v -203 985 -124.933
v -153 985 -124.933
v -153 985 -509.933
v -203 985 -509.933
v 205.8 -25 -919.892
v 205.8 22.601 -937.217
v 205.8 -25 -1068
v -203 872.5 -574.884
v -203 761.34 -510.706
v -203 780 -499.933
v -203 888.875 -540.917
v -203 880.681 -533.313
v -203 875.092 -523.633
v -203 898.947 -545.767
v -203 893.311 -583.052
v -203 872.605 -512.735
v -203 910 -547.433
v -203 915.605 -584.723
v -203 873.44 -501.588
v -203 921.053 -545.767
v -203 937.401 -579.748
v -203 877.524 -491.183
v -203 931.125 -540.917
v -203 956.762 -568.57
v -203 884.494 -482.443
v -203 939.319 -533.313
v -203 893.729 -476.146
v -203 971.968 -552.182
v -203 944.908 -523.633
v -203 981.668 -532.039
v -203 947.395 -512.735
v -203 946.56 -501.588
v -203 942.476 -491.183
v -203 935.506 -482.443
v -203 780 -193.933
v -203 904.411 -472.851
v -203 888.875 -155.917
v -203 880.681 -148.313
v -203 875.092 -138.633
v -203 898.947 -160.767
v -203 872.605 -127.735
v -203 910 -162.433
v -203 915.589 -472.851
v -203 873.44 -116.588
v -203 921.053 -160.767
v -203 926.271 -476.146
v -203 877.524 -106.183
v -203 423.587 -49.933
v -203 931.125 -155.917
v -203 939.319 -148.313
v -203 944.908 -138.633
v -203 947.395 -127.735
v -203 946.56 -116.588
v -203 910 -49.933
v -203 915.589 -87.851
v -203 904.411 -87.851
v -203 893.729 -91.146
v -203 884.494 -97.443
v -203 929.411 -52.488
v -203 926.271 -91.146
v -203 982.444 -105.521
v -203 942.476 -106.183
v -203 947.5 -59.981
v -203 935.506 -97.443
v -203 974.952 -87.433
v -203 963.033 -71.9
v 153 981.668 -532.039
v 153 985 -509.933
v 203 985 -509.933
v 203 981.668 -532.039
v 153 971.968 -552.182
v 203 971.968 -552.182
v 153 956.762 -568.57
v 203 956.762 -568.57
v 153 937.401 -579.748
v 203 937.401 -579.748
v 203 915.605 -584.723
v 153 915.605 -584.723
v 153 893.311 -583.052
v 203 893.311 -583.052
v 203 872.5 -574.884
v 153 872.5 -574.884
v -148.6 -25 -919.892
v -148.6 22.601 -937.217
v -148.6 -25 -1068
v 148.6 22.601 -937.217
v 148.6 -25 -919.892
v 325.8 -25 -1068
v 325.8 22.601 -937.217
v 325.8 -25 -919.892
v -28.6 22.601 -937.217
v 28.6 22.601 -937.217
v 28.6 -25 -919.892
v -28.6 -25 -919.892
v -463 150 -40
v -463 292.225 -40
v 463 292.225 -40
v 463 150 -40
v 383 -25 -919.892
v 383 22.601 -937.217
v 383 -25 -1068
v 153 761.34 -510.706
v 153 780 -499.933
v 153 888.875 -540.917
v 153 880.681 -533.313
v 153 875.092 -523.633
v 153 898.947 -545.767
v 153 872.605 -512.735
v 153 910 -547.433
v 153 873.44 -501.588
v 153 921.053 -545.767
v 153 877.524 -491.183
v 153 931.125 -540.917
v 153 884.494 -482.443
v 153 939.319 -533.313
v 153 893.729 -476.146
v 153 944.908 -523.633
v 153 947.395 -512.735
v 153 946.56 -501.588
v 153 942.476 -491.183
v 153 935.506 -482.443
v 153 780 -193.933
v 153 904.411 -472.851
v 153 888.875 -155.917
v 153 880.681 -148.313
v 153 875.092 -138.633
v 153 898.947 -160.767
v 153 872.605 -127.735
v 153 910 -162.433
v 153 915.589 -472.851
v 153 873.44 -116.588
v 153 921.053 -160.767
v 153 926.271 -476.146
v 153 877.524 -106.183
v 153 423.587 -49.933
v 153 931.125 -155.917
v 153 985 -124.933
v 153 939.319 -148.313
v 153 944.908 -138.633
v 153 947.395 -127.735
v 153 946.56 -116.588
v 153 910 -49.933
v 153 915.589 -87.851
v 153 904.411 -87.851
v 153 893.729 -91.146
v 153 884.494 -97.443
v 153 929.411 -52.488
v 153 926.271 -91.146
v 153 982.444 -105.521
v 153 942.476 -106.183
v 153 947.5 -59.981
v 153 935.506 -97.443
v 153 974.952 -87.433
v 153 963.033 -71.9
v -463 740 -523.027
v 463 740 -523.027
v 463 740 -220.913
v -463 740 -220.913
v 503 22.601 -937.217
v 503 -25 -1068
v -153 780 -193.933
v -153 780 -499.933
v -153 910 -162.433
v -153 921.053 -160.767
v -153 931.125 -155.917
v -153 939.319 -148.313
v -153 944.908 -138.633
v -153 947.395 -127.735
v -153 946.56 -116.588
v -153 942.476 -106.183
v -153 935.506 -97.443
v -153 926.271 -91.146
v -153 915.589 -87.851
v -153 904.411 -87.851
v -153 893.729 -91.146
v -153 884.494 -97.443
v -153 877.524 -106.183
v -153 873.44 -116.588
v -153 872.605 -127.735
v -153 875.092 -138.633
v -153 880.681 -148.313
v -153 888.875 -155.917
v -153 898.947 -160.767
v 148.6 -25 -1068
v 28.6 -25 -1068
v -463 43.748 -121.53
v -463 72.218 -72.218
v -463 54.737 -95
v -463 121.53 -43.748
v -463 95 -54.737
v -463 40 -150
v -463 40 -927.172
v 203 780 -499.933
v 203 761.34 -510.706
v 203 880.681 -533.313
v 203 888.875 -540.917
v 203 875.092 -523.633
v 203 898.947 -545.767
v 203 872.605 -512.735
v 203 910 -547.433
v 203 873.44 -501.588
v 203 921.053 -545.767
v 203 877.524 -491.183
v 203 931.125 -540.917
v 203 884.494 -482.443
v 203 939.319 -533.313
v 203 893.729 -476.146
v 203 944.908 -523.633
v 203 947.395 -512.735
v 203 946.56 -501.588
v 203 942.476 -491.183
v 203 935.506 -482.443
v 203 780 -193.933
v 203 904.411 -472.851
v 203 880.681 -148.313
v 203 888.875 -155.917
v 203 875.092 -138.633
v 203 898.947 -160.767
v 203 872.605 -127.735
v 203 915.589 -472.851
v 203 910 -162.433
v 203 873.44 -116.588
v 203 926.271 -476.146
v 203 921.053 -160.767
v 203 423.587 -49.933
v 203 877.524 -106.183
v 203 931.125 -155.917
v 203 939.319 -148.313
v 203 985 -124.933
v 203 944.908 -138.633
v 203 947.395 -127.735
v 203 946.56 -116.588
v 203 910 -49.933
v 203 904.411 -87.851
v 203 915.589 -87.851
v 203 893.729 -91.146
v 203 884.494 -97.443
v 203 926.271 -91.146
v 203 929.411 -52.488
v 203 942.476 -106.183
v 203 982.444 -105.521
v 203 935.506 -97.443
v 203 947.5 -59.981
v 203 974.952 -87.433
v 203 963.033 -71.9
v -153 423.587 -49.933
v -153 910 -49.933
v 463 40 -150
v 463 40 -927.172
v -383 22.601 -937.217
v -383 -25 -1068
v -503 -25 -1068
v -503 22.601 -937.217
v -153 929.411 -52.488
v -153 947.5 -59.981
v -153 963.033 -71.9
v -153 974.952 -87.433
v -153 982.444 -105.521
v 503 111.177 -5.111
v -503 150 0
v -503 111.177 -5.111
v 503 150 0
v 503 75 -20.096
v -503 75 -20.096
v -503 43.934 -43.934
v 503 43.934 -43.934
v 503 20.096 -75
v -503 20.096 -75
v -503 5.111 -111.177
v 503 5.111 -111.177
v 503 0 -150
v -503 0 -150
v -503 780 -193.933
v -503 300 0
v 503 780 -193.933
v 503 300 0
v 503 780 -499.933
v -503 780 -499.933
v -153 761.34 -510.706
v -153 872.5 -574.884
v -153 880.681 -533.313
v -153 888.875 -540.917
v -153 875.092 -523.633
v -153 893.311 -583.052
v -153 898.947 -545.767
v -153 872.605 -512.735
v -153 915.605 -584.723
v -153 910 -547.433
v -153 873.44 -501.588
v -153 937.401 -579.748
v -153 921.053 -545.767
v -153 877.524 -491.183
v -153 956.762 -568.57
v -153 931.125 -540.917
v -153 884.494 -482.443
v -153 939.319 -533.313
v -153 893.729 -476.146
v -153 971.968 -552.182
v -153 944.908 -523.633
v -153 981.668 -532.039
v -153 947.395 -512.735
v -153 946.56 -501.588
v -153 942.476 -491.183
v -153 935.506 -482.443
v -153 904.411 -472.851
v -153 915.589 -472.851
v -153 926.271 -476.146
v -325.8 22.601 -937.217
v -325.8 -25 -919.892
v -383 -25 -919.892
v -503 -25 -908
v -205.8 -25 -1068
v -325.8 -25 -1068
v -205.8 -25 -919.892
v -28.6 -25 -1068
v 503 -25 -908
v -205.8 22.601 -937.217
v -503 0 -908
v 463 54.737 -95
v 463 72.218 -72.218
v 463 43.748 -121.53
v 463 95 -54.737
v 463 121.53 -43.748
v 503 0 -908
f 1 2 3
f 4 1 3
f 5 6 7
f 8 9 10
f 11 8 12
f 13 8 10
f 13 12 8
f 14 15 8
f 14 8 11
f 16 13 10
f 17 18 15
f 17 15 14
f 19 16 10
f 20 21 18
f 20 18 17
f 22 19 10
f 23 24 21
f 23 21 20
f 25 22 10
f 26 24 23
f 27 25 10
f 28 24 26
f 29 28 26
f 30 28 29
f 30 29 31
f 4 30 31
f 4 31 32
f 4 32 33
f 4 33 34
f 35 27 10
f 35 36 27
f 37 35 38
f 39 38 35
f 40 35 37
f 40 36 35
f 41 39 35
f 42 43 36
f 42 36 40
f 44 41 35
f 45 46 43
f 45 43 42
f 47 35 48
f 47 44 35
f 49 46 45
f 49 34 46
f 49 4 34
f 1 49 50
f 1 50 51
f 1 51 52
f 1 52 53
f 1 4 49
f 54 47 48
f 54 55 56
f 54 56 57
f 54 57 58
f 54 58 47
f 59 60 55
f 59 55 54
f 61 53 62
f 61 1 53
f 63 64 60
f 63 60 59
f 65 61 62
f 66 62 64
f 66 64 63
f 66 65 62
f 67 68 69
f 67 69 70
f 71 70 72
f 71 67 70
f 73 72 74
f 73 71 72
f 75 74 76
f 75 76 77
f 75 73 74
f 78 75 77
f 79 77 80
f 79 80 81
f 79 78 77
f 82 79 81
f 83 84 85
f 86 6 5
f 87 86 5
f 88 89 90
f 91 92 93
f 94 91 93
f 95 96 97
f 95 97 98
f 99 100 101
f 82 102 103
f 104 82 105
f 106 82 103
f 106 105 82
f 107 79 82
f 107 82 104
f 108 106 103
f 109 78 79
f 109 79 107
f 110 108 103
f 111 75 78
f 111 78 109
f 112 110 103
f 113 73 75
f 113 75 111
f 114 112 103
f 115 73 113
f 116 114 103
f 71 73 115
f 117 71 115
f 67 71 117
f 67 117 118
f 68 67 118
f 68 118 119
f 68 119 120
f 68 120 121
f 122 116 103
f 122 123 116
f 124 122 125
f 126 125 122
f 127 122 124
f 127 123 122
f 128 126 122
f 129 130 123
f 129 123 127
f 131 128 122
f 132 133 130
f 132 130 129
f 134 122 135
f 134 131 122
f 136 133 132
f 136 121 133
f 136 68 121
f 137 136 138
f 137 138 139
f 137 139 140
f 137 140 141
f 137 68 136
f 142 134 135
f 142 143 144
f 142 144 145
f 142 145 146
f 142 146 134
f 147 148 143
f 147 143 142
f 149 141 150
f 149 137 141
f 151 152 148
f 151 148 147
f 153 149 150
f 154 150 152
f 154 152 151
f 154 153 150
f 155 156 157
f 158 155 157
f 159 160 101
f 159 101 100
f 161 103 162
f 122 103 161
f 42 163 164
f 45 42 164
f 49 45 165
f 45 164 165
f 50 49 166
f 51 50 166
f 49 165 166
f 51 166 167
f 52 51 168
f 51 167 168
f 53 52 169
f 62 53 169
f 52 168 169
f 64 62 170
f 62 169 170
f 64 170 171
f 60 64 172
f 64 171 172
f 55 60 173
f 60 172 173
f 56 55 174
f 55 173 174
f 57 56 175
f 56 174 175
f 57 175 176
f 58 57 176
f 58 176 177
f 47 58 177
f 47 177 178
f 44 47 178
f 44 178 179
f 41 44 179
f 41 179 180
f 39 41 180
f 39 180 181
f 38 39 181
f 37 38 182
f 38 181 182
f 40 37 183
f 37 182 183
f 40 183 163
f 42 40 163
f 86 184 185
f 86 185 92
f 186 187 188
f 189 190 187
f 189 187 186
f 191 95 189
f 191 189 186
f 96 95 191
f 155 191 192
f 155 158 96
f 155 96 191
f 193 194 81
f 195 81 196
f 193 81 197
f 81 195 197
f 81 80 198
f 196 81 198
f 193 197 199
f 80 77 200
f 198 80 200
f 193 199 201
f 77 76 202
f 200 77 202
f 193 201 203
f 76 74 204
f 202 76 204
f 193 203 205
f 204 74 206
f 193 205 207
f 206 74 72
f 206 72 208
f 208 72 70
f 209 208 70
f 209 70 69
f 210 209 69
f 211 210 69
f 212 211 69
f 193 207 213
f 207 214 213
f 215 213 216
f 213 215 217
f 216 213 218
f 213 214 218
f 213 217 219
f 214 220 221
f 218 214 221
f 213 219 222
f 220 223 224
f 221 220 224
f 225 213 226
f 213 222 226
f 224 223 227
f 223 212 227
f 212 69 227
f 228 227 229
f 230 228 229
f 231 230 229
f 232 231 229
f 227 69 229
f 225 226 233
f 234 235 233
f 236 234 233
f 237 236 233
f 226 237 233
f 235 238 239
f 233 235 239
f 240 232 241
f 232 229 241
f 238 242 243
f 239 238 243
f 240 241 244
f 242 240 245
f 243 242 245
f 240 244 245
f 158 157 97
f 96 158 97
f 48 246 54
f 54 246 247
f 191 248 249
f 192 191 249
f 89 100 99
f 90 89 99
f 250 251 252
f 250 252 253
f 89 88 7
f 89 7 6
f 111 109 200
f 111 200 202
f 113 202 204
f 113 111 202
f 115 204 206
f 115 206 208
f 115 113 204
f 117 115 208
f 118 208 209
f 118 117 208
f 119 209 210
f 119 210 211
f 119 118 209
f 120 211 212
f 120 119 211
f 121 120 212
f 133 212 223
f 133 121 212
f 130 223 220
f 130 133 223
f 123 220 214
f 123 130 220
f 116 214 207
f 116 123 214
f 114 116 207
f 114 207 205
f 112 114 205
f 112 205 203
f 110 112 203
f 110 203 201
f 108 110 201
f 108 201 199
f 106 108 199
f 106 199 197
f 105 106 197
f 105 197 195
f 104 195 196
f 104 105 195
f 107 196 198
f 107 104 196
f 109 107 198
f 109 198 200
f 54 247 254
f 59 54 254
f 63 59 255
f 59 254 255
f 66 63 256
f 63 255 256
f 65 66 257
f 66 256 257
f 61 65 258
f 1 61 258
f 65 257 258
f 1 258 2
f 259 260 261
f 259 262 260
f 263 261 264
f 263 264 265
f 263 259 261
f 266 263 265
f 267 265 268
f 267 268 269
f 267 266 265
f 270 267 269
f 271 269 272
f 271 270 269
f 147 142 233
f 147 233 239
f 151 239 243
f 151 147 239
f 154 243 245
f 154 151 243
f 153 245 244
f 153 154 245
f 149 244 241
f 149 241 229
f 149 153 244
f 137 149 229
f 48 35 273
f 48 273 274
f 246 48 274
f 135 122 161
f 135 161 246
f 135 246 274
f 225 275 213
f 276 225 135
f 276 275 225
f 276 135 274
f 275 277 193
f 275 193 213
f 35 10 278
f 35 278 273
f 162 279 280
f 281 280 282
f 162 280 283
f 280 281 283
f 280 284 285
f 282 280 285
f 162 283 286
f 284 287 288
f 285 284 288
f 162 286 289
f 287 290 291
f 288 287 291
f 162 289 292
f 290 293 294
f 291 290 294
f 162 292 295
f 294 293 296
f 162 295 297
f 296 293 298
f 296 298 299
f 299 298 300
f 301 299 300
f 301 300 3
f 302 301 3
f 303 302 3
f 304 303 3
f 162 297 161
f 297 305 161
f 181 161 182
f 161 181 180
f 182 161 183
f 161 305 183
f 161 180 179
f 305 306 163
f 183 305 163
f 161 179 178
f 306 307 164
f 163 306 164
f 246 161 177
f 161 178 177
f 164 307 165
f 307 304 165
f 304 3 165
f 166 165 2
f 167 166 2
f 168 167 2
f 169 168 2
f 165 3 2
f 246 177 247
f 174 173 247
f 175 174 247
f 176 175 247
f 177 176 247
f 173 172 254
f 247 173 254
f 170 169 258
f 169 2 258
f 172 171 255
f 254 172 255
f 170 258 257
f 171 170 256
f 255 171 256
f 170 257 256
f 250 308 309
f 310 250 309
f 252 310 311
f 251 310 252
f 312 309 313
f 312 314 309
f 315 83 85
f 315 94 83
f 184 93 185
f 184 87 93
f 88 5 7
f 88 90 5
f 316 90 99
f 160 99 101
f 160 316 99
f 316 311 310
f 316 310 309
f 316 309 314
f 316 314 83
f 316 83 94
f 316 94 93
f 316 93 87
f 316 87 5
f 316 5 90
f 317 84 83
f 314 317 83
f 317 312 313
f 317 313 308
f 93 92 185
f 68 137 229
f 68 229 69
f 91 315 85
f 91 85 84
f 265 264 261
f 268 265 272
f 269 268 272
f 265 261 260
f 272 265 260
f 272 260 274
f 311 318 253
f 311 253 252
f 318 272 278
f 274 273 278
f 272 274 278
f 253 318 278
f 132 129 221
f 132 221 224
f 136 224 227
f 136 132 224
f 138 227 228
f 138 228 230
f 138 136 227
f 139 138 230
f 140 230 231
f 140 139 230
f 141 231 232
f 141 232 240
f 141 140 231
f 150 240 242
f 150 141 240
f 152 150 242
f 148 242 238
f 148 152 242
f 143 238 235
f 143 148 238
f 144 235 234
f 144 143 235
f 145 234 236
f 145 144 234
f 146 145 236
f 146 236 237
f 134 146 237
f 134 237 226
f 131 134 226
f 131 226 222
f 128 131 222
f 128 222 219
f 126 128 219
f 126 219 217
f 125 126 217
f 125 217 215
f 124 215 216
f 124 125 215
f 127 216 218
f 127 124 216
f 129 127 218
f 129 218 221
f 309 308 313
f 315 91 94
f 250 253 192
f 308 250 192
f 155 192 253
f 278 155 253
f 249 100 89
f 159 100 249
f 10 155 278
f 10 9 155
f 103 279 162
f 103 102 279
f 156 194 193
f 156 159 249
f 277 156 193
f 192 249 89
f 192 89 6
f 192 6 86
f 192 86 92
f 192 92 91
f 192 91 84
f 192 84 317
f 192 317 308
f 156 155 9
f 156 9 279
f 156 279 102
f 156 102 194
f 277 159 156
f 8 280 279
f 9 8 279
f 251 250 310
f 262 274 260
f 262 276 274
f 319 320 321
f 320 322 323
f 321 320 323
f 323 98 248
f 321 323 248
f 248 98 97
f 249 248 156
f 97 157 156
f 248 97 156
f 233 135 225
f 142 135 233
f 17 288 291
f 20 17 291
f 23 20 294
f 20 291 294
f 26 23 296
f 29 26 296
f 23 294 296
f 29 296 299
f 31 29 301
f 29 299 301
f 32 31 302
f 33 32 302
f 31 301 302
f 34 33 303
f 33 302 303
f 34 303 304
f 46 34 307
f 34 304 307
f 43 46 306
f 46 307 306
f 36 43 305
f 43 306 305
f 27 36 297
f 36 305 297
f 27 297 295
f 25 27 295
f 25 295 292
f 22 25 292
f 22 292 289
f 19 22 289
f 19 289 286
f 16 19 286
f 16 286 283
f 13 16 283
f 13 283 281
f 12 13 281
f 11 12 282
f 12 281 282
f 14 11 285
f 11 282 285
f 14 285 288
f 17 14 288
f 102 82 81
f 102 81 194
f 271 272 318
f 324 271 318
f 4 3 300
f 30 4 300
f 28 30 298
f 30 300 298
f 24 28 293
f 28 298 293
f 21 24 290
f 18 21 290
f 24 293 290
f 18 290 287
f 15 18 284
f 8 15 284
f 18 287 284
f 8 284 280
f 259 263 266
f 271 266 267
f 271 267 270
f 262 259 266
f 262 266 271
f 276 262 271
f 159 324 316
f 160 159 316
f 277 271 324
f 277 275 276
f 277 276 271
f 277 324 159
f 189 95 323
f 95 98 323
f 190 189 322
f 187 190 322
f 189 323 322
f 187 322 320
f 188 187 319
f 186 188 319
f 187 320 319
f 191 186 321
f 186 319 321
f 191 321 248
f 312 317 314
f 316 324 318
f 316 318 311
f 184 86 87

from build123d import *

# Parameters (mm, degrees)
BOSS_EXTRUDE1_DEPTH = 503
CUT_EXTRUDE1_DEPTH  = 463
CUT_EXTRUDE2_DEPTH  = 28.6
LPATTERN1_COUNT     = 3
LPATTERN1_PITCH     = 177.2
LPATTERN1_COL_COUNT = 3
LPATTERN1_COL_PITCH = 177.2
SKETCH5_R           = 37.5
BOSS_EXTRUDE2_DEPTH = 50


with BuildPart() as part:
    # Sketch1 → Boss-Extrude1 (new, symmetric)
    with BuildSketch(Plane(origin=(0, 0, 0), x_dir=(0, 0, -1), z_dir=(1, 0, 0))):
        with BuildLine():
            Line((150, 0), (908, 0))
            Line((908, 0), (908, -25))
            Line((908, -25), (1068, -25))
            Line((1068, -25), (937.217045761, 22.601102492))
            Line((937.217045761, 22.601102492), (499.932588401, 780))
            Line((499.932588401, 780), (193.932588401, 780))
            Line((193.932588401, 780), (0, 300))
            Line((0, 300), (0, 150))
            ThreePointArc((0, 150), (43.933982822, 43.933982822), (150, 0))
        make_face()
    extrude(amount=BOSS_EXTRUDE1_DEPTH, both=True)

    # Sketch2 → Cut-Extrude1 (cut, symmetric)
    with BuildSketch(Plane(origin=(0, 0, 0), x_dir=(0, 0, -1), z_dir=(1, 0, 0))):
        with BuildLine():
            Line((908, 40), (1011.713283141, 40))
            Line((1011.713283141, 40), (1011.713283141, 740))
            Line((1011.713283141, 740), (499.932588401, 740))
            Line((499.932588401, 740), (220.912929075, 740))
            Line((220.912929075, 740), (40, 292.224787634))
            Line((40, 292.224787634), (40, 150))
            ThreePointArc((40, 150), (72.218254069, 72.218254069), (150, 40))
            Line((150, 40), (908, 40))
        make_face()
    extrude(amount=CUT_EXTRUDE1_DEPTH, both=True, mode=Mode.SUBTRACT)

    # Sketch3 → Cut-Extrude2 (cut, symmetric)
    with BuildSketch(Plane(origin=(0, 0, 0), x_dir=(0, 0, -1), z_dir=(1, 0, 0))):
        Polygon((946.796612299, 48.920745244), (905.079735991, -65.695430422), (1089.944771032, -65.695430422), (1089.944771032, 48.920745244), align=None)
    cut_extrude2 = extrude(amount=CUT_EXTRUDE2_DEPTH, both=True, mode=Mode.SUBTRACT)

    # LPattern1: Cut-Extrude2 ×3
    with Locations(*[(i * LPATTERN1_PITCH, 0, 0) for i in range(1, LPATTERN1_COUNT)]):
        add(cut_extrude2, mode=Mode.SUBTRACT)

    # LPattern1 col: Cut-Extrude2 ×3
    with Locations(*[(-i * LPATTERN1_COL_PITCH, 0, 0) for i in range(1, LPATTERN1_COL_COUNT)]):
        add(cut_extrude2, mode=Mode.SUBTRACT)

    # Sketch5 → Boss-Extrude2 (add)
    with BuildSketch(Plane(origin=(153, 0, 0), x_dir=(0, 0, -1), z_dir=(1, 0, 0))):
        with BuildLine():
            Line((49.932588401, 423.587493108), (49.932588401, 910))
            ThreePointArc((49.932588401, 910), (71.899579812, 963.033008589), (124.932588401, 985))
            Line((124.932588401, 985), (509.932588401, 985))
            ThreePointArc((509.932588401, 985), (574.884493685, 947.5), (574.884493685, 872.5))
            Line((574.884493685, 872.5), (510.706091093, 761.339745962))
            Line((510.706091093, 761.339745962), (499.932588401, 780))
            Line((499.932588401, 780), (193.932588401, 780))
            Line((193.932588401, 780), (49.932588401, 423.587493108))
        make_face()
        with Locations((124.932588401, 910)):
            Circle(SKETCH5_R, mode=Mode.SUBTRACT)
        with Locations((509.932588401, 910)):
            Circle(SKETCH5_R, mode=Mode.SUBTRACT)
    boss_extrude2 = extrude(amount=BOSS_EXTRUDE2_DEPTH)

    # Mirror1: Boss-Extrude2 across plane
    add(boss_extrude2.mirror(Plane(origin=(0, 0, 0), x_dir=(0, 0, 1), z_dir=(1, 0, 0))))


solid = part.part
